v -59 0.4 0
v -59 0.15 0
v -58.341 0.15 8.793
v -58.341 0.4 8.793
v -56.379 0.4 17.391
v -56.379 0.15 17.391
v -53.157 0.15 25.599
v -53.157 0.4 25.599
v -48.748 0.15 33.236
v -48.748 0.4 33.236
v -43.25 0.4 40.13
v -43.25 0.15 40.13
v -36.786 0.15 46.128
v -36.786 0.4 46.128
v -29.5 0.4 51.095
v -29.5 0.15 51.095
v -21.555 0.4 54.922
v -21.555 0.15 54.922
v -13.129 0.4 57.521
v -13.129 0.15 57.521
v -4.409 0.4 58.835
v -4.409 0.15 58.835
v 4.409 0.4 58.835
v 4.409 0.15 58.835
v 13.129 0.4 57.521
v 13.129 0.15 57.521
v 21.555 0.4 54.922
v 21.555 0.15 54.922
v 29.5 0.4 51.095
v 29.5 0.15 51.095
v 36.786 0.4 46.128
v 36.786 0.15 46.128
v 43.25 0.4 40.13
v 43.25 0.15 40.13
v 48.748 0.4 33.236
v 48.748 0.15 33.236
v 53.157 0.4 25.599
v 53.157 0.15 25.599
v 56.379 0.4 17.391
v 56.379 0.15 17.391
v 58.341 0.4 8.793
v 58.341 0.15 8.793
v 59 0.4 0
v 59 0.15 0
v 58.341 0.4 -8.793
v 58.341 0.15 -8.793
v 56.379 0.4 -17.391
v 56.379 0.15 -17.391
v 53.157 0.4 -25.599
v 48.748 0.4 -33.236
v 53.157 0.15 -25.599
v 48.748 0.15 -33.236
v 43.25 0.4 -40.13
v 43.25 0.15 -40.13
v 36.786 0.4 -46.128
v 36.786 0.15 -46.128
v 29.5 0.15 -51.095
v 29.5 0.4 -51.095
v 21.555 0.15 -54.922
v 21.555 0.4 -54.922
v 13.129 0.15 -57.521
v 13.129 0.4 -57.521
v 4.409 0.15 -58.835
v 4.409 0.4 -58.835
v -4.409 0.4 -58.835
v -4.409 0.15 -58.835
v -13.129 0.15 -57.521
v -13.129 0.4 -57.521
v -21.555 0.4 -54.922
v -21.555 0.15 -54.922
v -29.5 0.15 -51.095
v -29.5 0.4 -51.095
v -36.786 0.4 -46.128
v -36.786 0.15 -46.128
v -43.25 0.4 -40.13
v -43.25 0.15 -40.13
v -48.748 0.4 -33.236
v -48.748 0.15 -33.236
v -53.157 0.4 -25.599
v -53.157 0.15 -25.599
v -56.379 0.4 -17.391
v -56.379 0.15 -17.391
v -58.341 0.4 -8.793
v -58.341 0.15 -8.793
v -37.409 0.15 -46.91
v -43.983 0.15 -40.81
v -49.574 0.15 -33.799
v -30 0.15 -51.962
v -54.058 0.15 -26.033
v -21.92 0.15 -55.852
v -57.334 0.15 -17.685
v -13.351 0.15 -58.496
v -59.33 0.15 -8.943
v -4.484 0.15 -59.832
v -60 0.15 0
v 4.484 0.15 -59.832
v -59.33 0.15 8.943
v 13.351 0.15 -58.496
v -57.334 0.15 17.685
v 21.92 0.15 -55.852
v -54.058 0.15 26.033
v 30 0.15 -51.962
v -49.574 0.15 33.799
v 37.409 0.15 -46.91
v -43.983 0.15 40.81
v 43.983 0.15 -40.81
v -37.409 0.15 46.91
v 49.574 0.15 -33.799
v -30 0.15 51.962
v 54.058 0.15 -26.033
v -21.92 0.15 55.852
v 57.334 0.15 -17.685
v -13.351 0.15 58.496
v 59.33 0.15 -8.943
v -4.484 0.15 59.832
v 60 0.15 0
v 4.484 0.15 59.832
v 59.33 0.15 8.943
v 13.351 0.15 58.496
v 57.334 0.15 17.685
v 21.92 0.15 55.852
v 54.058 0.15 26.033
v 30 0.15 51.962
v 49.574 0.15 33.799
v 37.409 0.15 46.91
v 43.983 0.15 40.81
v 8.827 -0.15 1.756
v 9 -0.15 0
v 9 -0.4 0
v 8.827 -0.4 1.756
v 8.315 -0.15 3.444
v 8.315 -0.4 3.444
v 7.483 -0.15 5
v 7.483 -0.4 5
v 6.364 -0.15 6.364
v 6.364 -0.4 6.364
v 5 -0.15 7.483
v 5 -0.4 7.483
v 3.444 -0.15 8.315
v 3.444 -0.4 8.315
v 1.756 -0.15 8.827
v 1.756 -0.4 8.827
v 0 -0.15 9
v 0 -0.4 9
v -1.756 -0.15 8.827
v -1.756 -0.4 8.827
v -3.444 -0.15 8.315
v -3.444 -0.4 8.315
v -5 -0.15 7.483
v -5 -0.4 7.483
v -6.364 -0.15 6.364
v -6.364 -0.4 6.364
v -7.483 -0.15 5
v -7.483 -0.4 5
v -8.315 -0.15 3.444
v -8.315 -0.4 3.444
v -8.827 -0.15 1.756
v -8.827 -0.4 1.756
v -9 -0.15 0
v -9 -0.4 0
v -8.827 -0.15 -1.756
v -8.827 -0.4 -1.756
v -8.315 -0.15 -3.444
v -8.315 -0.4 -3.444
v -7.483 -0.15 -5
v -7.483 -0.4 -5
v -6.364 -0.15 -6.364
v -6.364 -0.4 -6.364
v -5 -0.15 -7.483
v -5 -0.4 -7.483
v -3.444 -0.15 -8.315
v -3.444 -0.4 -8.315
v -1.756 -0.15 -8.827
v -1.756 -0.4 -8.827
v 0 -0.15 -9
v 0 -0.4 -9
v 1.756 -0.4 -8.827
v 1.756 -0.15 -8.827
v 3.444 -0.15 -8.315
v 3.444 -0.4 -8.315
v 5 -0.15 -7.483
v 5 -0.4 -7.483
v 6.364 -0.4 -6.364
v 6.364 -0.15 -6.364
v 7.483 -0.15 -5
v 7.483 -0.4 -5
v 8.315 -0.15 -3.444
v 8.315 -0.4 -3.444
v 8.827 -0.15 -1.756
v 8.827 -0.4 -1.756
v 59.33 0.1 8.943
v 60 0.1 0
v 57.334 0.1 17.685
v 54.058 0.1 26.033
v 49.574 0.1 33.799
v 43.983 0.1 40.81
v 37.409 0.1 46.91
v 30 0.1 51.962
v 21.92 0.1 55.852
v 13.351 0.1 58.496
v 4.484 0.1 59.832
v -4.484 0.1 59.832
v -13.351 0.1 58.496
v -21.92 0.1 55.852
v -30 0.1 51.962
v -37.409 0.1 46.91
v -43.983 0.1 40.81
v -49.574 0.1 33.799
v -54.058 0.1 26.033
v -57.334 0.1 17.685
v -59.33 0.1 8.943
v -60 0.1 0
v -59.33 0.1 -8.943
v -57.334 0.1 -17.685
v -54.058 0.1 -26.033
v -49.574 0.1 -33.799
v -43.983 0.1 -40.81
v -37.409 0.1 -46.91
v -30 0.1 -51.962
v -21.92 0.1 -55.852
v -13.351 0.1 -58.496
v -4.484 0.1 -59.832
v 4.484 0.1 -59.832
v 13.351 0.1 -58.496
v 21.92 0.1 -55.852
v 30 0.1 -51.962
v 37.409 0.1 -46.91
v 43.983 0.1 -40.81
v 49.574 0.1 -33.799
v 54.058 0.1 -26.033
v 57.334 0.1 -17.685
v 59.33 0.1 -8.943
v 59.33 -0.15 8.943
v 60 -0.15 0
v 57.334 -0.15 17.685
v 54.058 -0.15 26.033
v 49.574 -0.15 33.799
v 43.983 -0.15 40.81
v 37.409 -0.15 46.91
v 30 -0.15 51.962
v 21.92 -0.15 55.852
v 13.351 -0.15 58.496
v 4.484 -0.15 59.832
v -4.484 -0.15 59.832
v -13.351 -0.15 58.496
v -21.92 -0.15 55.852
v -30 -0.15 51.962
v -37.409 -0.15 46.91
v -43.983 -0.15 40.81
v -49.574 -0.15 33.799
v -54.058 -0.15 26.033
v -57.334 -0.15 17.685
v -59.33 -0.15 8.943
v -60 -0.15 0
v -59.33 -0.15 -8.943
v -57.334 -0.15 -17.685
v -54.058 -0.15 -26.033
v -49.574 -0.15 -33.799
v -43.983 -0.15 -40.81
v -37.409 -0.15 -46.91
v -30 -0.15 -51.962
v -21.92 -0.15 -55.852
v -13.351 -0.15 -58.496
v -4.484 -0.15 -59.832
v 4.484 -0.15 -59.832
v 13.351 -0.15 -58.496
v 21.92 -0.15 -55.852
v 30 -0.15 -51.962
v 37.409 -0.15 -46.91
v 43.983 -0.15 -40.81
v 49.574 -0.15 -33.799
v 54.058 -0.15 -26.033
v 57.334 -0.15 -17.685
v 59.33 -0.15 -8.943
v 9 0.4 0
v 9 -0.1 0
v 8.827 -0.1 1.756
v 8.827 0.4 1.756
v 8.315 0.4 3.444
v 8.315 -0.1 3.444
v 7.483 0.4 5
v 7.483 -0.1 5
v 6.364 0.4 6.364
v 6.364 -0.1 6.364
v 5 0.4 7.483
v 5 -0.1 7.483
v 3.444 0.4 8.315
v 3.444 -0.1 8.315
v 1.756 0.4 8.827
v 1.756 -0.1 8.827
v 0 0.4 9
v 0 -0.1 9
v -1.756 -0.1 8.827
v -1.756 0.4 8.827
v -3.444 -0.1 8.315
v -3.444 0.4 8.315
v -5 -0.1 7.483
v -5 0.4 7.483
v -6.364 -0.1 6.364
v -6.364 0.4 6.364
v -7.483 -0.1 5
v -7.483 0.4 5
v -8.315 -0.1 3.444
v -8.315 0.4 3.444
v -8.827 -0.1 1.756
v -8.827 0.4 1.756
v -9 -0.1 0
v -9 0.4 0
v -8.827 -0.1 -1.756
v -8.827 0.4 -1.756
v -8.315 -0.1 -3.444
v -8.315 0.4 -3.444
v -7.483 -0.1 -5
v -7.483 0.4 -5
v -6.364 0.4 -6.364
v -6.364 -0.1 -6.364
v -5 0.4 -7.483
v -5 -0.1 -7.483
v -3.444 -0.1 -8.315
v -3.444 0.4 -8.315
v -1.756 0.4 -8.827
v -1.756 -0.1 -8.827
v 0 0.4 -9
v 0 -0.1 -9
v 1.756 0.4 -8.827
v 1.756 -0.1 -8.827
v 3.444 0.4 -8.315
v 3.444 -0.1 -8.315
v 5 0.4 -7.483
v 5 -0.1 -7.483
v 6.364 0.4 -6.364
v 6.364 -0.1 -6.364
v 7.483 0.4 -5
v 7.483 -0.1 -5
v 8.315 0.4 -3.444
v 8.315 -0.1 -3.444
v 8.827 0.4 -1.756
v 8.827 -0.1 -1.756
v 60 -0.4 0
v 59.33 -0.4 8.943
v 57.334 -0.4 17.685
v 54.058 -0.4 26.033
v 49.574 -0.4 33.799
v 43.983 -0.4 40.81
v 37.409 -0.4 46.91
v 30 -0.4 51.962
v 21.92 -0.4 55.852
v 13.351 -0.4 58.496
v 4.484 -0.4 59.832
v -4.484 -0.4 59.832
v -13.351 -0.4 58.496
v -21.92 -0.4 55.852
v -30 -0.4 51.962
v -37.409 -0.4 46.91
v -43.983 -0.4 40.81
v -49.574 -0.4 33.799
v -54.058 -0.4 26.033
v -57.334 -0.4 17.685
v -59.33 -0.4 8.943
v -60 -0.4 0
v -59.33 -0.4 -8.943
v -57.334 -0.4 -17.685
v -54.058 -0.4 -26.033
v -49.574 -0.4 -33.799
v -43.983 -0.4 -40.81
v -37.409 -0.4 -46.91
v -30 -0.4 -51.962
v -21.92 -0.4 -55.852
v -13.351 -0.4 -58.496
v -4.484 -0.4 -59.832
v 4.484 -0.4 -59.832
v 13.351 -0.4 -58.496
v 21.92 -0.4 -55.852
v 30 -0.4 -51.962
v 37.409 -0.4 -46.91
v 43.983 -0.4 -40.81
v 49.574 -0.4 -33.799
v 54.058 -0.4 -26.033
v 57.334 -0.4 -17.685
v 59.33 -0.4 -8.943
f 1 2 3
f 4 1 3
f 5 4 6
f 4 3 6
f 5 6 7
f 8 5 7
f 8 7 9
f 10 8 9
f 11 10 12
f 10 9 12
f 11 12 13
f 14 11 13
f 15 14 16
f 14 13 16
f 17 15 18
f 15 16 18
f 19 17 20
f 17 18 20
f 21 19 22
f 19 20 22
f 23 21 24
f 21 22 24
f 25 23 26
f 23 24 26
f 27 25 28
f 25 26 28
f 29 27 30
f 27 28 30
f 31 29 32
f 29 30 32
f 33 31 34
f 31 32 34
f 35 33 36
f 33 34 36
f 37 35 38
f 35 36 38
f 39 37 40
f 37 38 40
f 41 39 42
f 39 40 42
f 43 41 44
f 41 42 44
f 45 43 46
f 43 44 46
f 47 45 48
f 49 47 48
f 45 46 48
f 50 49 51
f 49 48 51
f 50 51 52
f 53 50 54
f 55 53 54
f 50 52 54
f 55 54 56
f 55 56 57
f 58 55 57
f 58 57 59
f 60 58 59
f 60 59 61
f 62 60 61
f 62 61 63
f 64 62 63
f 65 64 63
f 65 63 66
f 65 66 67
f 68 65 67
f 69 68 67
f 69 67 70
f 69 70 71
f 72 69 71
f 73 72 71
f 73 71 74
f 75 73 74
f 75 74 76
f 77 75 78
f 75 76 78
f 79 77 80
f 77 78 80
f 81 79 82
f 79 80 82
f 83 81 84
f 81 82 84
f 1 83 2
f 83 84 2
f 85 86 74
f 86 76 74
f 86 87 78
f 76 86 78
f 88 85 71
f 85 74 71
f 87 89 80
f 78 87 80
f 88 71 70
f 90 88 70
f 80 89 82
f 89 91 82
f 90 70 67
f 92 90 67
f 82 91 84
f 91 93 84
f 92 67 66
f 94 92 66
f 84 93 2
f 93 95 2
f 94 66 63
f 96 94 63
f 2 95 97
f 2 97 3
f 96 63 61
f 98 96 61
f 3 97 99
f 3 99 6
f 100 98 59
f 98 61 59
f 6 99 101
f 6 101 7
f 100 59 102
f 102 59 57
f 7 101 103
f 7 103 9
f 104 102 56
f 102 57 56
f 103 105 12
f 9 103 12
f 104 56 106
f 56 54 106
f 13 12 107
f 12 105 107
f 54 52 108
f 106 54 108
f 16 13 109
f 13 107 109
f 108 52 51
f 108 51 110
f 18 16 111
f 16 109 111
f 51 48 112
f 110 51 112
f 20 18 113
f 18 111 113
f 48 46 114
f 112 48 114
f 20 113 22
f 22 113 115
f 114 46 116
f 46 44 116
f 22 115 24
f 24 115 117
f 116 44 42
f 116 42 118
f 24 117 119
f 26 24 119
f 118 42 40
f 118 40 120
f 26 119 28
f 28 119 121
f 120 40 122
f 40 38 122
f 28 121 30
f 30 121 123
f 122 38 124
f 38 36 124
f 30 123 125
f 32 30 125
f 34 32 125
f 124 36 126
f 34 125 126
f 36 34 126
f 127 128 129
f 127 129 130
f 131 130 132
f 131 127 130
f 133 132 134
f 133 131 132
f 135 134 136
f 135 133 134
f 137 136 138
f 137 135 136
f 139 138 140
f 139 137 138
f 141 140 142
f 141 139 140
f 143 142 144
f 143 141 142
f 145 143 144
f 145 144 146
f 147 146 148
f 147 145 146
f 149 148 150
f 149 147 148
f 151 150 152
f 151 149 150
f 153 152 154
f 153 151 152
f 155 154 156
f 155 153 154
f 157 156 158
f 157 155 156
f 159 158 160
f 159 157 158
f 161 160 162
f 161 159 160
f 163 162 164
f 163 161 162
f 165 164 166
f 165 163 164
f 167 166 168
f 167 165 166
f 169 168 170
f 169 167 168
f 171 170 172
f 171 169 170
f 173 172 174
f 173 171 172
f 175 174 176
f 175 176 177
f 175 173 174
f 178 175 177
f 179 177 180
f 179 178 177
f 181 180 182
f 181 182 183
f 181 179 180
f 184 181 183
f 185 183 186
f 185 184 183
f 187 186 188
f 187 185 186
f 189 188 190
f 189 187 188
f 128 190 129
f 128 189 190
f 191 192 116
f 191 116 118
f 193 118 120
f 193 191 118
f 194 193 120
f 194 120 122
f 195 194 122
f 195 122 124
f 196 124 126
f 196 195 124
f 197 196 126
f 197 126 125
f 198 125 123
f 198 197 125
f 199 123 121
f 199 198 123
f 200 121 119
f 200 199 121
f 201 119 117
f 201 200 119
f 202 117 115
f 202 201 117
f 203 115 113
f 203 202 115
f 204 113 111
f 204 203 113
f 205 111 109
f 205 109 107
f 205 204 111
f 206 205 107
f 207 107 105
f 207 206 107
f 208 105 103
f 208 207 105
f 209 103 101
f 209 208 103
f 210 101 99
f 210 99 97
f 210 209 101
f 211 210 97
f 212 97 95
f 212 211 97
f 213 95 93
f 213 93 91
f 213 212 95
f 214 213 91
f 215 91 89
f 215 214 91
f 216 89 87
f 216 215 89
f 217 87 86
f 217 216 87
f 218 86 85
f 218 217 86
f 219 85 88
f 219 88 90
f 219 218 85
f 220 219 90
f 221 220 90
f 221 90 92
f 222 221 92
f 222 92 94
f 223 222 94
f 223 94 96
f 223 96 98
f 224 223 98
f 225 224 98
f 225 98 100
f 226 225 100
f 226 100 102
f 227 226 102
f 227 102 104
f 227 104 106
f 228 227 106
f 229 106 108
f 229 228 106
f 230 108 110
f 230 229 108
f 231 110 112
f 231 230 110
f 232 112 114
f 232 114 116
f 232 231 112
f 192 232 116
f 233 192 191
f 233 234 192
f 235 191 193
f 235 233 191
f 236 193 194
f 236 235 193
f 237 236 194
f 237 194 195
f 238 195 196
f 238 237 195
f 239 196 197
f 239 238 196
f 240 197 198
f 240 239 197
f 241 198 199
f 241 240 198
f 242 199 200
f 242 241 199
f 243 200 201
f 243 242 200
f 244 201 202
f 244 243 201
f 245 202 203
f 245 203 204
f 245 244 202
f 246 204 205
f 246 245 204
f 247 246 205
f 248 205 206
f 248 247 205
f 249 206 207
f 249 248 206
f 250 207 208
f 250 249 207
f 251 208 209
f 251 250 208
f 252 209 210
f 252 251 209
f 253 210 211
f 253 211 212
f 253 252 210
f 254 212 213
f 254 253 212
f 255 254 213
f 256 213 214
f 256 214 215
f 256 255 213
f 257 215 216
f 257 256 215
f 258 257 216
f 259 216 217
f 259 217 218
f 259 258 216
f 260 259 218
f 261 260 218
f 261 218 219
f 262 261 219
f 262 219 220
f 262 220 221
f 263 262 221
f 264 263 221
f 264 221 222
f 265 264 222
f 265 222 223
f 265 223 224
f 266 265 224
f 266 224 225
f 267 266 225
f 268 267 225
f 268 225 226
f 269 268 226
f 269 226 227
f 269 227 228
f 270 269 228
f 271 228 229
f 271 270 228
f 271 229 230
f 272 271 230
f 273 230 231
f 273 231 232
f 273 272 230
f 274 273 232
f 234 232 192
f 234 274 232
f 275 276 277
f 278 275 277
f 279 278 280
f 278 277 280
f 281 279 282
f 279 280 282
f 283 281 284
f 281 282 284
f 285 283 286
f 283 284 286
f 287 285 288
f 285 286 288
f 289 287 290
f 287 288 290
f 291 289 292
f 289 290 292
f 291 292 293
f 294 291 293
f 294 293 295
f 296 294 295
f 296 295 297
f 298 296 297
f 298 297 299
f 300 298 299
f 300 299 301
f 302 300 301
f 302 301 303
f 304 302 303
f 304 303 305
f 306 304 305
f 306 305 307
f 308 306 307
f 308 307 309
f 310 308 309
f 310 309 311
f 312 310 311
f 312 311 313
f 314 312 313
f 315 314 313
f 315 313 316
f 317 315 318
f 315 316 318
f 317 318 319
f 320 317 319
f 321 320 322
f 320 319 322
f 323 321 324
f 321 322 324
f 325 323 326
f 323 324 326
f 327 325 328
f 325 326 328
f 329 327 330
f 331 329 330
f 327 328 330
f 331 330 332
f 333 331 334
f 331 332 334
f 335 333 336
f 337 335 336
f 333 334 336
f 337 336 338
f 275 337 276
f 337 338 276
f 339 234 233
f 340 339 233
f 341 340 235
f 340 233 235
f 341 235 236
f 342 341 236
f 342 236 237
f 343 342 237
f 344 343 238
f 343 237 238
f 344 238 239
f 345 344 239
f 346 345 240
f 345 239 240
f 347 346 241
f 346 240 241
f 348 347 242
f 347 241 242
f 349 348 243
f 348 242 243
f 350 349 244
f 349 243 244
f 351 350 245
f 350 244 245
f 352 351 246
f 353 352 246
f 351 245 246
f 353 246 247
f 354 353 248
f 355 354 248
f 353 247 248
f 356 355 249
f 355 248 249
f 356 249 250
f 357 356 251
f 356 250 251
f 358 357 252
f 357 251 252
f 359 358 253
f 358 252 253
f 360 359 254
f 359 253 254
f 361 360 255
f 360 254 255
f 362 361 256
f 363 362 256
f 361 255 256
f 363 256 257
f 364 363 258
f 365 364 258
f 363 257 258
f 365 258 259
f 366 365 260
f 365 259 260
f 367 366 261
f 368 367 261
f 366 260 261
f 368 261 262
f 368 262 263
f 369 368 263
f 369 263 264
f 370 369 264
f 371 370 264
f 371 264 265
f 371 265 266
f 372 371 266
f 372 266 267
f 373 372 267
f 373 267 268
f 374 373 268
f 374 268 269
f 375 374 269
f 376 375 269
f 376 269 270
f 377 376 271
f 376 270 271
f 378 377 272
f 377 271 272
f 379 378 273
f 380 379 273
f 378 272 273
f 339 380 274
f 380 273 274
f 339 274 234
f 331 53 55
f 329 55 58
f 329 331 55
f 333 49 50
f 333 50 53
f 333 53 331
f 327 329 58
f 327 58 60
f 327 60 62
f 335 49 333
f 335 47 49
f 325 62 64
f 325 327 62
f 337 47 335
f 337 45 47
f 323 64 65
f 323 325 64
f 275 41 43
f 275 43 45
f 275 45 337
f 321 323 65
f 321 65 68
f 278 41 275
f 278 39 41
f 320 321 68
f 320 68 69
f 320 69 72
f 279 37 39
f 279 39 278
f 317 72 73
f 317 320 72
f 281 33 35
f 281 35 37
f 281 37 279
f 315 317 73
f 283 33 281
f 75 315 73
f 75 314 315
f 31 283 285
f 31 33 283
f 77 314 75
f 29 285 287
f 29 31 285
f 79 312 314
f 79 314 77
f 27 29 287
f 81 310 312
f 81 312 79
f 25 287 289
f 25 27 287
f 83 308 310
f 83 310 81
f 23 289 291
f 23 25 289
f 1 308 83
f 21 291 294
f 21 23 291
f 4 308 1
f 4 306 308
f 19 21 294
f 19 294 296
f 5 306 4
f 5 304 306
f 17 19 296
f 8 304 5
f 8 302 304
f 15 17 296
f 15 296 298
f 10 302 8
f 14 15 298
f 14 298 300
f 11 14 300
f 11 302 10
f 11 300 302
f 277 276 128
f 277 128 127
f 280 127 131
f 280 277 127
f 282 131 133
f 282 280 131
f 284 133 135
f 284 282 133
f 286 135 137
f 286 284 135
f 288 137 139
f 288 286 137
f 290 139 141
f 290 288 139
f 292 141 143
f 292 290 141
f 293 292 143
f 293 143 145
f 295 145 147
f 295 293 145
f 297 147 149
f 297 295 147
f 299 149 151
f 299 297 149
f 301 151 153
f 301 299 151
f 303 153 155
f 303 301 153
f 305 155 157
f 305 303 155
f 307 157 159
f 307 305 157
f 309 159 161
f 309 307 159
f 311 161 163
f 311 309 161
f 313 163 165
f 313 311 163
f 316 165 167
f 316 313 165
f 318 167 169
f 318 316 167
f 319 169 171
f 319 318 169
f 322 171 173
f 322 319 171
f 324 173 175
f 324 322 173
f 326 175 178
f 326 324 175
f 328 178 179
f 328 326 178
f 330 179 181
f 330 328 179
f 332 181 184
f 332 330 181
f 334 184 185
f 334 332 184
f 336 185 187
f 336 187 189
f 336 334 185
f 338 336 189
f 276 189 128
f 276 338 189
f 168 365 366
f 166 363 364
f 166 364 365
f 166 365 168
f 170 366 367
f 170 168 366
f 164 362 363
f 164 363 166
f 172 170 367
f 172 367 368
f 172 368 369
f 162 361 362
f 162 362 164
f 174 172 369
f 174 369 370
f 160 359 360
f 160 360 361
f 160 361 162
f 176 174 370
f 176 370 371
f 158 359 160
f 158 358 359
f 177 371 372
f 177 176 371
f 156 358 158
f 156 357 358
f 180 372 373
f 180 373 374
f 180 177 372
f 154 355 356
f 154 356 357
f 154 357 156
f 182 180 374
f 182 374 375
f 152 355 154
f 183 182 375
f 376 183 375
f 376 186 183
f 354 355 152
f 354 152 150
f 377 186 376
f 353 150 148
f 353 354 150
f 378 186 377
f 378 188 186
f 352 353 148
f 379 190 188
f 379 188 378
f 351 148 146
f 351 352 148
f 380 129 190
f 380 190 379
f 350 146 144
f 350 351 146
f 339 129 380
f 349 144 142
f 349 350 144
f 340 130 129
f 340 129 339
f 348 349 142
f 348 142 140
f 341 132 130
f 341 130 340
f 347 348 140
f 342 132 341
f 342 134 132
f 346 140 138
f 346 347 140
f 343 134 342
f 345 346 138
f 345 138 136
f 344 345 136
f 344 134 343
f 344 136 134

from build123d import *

# Parameters (mm, degrees)
F0_R         = 60
F0_R_2       = 9
F1_DEPTH     = 0.15
F2_R         = 59
F1_FACE1_R   = 60
F1_FACE1_R_2 = 9
F3_DEPTH     = 0.25
F4_DEPTH     = 0.501


with BuildPart() as f1:
    # F0 (on Front) → F1 (new body, symmetric)
    with BuildSketch(Plane.XZ):
        Circle(F0_R)
        Circle(F0_R_2, mode=Mode.SUBTRACT)
    extrude(amount=F1_DEPTH, both=True)

    # F2 (on face) + F1_face1 (on face) → F3 (join, symmetric)
    with BuildSketch(Plane(origin=(0, 0.15, 0), x_dir=(-1, 0, 0), z_dir=(0, 1, 0))):
        Circle(F2_R)
    with BuildSketch(Plane.XZ.offset(0.15)):
        Circle(F1_FACE1_R)
        Circle(F1_FACE1_R_2, mode=Mode.SUBTRACT)
    extrude(amount=F3_DEPTH, both=True, dir=(0, 1, 0))

    # F4 (cut, through all): a face of the model
    f4_faces = [f1.faces().sort_by_distance(p)[0] for p in [
        (0, -0.1, 0),
    ]]
    extrude(f4_faces, amount=-F4_DEPTH, mode=Mode.SUBTRACT)


solid = f1.part
